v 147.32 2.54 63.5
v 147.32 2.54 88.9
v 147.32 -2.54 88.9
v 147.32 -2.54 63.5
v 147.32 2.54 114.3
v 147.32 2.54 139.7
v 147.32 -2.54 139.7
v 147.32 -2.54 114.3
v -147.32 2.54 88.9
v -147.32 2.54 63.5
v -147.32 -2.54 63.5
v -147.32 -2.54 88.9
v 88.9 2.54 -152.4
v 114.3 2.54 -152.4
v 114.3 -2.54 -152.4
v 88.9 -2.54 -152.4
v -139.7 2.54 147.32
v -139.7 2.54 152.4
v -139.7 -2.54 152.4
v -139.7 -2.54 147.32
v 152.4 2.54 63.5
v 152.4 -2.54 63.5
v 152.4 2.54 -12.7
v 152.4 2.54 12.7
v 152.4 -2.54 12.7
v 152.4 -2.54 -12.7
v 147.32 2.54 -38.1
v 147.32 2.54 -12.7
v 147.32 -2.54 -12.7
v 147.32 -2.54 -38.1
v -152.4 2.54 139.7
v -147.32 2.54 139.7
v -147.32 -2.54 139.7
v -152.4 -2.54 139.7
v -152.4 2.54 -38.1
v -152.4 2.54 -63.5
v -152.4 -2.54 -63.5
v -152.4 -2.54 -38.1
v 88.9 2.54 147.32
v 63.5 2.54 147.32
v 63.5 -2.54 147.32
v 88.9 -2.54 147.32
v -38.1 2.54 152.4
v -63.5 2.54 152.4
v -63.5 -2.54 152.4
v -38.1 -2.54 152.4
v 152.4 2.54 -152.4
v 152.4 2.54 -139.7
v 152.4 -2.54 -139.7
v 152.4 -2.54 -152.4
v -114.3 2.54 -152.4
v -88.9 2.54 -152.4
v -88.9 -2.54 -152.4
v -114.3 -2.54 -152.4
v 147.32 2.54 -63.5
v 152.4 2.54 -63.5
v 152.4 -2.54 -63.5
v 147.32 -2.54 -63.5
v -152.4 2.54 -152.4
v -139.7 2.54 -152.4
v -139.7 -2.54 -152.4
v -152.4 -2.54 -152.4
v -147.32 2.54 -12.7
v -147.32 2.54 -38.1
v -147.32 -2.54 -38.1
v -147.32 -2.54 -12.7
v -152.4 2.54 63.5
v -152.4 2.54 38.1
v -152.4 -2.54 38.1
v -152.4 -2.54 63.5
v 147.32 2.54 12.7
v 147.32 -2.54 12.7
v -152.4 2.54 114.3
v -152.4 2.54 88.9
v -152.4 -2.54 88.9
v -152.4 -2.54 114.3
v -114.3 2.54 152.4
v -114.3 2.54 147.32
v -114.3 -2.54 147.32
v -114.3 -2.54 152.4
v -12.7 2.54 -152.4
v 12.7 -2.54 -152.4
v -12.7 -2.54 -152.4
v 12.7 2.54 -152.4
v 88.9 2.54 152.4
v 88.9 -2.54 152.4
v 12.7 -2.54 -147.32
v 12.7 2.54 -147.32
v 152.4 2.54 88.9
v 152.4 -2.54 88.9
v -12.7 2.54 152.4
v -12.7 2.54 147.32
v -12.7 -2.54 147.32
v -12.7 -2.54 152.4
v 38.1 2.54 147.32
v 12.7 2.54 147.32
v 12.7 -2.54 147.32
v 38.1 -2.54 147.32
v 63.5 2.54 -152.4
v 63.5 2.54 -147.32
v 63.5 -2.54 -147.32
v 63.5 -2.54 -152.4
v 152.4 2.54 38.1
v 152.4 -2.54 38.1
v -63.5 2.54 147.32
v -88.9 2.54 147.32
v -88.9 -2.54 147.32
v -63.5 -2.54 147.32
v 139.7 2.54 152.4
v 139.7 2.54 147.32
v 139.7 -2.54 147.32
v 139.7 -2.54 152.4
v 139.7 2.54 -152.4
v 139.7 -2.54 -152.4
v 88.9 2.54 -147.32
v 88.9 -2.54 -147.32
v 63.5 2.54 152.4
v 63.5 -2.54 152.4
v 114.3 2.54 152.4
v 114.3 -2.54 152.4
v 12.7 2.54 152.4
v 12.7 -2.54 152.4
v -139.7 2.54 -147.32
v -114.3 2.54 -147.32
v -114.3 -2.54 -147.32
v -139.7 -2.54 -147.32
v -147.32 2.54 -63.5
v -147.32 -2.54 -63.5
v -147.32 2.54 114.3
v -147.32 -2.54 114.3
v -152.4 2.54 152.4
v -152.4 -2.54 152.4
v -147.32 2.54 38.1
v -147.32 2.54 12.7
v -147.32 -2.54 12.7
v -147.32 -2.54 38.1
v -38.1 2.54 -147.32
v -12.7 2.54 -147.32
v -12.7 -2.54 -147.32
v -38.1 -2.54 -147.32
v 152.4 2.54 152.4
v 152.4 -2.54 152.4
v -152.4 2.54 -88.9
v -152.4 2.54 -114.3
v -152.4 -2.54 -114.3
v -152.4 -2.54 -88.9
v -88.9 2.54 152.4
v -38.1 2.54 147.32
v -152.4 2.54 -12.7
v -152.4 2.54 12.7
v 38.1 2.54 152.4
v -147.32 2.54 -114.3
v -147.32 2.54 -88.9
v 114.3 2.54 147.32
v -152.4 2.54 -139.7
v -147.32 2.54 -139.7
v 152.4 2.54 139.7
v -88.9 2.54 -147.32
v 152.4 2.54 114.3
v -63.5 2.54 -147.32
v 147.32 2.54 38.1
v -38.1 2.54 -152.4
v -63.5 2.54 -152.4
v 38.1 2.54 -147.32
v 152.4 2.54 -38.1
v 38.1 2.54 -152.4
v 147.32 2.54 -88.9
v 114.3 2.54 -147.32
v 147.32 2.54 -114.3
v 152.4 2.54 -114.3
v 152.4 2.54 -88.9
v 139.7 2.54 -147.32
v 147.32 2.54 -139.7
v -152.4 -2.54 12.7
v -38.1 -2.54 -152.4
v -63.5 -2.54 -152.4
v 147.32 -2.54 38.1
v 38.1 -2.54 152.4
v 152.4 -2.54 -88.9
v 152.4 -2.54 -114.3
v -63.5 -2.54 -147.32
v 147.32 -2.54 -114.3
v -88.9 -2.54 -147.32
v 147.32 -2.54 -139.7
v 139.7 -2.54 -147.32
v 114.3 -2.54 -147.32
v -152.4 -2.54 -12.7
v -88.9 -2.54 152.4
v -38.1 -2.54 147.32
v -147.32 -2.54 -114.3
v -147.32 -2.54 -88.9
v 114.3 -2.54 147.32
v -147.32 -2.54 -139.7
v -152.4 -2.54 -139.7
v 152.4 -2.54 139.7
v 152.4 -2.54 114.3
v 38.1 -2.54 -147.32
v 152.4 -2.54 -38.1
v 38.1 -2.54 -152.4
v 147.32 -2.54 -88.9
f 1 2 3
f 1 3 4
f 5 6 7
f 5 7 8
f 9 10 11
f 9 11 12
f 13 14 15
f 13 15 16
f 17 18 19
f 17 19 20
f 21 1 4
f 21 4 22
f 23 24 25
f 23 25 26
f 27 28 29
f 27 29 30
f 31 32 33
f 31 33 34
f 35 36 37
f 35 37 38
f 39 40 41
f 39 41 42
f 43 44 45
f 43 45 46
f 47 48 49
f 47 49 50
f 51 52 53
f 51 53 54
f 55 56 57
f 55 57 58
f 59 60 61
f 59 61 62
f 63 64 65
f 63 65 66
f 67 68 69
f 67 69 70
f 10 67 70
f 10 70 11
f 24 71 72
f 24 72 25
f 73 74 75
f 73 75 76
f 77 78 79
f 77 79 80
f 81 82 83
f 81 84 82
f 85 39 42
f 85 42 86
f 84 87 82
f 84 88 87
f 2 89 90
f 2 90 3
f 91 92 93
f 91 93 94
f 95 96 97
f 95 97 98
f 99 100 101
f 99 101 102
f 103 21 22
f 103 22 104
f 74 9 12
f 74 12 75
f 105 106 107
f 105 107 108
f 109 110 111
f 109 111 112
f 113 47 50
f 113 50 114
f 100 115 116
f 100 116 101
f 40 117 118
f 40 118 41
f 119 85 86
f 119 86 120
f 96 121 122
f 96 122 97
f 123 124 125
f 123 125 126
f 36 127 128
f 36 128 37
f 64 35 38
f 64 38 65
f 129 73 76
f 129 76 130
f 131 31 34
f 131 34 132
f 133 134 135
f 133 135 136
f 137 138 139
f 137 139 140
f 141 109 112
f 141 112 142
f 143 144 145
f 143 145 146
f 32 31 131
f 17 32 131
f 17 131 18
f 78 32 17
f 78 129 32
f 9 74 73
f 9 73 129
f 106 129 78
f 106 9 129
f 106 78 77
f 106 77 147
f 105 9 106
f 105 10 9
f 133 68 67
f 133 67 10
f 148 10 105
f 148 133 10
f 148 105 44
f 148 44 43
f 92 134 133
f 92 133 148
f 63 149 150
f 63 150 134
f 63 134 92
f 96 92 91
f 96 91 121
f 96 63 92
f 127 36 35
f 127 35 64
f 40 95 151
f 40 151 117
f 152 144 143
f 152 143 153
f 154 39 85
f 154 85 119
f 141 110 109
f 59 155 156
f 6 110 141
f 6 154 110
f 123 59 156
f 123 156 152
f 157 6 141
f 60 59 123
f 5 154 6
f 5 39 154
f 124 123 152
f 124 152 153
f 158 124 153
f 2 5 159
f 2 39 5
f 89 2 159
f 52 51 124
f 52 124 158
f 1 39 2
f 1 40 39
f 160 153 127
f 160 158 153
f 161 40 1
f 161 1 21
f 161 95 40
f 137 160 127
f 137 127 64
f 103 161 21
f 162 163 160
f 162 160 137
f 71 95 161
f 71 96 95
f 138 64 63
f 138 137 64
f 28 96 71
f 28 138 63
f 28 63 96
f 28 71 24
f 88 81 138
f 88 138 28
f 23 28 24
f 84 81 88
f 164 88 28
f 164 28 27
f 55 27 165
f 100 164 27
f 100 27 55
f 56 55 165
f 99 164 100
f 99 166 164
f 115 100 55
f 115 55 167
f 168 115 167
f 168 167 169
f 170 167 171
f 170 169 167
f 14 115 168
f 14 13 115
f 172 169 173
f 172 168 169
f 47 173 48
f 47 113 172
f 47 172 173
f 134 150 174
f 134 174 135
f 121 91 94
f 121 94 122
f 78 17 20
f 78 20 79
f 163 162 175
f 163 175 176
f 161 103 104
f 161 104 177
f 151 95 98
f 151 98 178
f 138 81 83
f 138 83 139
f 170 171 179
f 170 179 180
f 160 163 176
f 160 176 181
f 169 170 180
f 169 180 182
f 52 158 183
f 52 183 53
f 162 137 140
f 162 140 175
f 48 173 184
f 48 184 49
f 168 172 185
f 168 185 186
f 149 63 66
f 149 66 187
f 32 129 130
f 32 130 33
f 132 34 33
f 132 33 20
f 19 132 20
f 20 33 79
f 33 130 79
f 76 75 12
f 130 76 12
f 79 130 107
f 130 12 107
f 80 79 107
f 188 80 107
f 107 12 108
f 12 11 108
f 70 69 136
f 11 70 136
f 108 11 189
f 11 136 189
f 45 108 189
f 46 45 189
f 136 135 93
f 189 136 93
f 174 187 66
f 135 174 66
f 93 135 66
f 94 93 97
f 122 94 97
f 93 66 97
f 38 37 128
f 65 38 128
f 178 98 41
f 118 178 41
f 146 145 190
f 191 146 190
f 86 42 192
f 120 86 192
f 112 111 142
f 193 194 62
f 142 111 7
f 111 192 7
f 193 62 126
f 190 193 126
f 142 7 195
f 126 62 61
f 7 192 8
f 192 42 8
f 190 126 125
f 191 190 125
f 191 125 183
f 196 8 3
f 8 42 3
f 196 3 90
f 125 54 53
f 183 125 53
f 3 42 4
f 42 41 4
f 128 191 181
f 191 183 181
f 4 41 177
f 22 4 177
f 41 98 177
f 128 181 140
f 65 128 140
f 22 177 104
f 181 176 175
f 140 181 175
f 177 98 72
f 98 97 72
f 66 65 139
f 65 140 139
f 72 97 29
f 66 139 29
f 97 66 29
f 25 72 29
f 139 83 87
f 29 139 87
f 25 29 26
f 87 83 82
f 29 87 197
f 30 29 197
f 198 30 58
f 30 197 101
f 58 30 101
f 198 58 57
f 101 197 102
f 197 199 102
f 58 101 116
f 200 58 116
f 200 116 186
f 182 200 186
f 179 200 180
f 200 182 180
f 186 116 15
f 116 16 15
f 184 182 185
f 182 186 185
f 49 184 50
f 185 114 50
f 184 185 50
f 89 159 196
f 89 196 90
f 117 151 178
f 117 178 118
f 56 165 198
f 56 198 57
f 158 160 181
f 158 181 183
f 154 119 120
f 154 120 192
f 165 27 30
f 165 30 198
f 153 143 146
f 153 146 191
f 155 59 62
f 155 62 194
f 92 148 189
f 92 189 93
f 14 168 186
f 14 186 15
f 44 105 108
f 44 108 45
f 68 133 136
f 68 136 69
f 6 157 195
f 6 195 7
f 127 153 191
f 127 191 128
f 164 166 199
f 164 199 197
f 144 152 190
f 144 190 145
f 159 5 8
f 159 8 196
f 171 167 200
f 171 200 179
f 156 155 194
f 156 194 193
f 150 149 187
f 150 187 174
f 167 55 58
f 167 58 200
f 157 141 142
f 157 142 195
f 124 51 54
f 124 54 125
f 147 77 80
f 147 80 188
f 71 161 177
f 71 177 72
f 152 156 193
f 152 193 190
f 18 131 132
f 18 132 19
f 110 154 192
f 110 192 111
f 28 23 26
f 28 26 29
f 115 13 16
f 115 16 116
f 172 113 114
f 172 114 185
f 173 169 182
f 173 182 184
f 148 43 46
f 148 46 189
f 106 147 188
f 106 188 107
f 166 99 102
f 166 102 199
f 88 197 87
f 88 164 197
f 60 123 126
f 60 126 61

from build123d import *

# Parameters (mm, degrees)
BOSS_EXTRUDE1_DEPTH = 2.54


with BuildPart() as part:
    # Sketch1 → Boss-Extrude1 (new body, symmetric)
    with BuildSketch(Plane(origin=(0, 0, 0), x_dir=(1, 0, 0), z_dir=(0, 1, 0))):
        Polygon((12.7, 152.4), (-12.7, 152.4), (-12.7, 147.32), (-38.1, 147.32), (-38.1, 152.4), (-63.5, 152.4), (-63.5, 147.32), (-88.9, 147.32), (-88.9, 152.4), (-114.3, 152.4), (-114.3, 147.32), (-139.7, 147.32), (-139.7, 152.4), (-152.4, 152.4), (-152.4, 139.7), (-147.32, 139.7), (-147.32, 114.3), (-152.4, 114.3), (-152.4, 88.9), (-147.32, 88.9), (-147.32, 63.5), (-152.4, 63.5), (-152.4, 38.1), (-147.32, 38.1), (-147.32, 12.7), (-152.4, 12.7), (-152.4, -12.7), (-147.32, -12.7), (-147.32, -38.1), (-152.4, -38.1), (-152.4, -63.5), (-147.32, -63.5), (-147.32, -88.9), (-152.4, -88.9), (-152.4, -114.3), (-147.32, -114.3), (-147.32, -139.7), (-152.4, -139.7), (-152.4, -152.4), (-139.7, -152.4), (-139.7, -147.32), (-114.3, -147.32), (-114.3, -152.4), (-88.9, -152.4), (-88.9, -147.32), (-63.5, -147.32), (-63.5, -152.4), (-38.1, -152.4), (-38.1, -147.32), (-12.7, -147.32), (-12.7, -152.4), (12.7, -152.4), (12.7, -147.32), (38.1, -147.32), (38.1, -152.4), (63.5, -152.4), (63.5, -147.32), (88.9, -147.32), (88.9, -152.4), (114.3, -152.4), (114.3, -147.32), (139.7, -147.32), (139.7, -152.4), (152.4, -152.4), (152.4, -139.7), (147.32, -139.7), (147.32, -114.3), (152.4, -114.3), (152.4, -88.9), (147.32, -88.9), (147.32, -63.5), (152.4, -63.5), (152.4, -38.1), (147.32, -38.1), (147.32, -12.7), (152.4, -12.7), (152.4, 12.7), (147.32, 12.7), (147.32, 38.1), (152.4, 38.1), (152.4, 63.5), (147.32, 63.5), (147.32, 88.9), (152.4, 88.9), (152.4, 114.3), (147.32, 114.3), (147.32, 139.7), (152.4, 139.7), (152.4, 152.4), (139.7, 152.4), (139.7, 147.32), (114.3, 147.32), (114.3, 152.4), (88.9, 152.4), (88.9, 147.32), (63.5, 147.32), (63.5, 152.4), (38.1, 152.4), (38.1, 147.32), (12.7, 147.32), align=None)
    extrude(amount=BOSS_EXTRUDE1_DEPTH, both=True)


solid = part.part
